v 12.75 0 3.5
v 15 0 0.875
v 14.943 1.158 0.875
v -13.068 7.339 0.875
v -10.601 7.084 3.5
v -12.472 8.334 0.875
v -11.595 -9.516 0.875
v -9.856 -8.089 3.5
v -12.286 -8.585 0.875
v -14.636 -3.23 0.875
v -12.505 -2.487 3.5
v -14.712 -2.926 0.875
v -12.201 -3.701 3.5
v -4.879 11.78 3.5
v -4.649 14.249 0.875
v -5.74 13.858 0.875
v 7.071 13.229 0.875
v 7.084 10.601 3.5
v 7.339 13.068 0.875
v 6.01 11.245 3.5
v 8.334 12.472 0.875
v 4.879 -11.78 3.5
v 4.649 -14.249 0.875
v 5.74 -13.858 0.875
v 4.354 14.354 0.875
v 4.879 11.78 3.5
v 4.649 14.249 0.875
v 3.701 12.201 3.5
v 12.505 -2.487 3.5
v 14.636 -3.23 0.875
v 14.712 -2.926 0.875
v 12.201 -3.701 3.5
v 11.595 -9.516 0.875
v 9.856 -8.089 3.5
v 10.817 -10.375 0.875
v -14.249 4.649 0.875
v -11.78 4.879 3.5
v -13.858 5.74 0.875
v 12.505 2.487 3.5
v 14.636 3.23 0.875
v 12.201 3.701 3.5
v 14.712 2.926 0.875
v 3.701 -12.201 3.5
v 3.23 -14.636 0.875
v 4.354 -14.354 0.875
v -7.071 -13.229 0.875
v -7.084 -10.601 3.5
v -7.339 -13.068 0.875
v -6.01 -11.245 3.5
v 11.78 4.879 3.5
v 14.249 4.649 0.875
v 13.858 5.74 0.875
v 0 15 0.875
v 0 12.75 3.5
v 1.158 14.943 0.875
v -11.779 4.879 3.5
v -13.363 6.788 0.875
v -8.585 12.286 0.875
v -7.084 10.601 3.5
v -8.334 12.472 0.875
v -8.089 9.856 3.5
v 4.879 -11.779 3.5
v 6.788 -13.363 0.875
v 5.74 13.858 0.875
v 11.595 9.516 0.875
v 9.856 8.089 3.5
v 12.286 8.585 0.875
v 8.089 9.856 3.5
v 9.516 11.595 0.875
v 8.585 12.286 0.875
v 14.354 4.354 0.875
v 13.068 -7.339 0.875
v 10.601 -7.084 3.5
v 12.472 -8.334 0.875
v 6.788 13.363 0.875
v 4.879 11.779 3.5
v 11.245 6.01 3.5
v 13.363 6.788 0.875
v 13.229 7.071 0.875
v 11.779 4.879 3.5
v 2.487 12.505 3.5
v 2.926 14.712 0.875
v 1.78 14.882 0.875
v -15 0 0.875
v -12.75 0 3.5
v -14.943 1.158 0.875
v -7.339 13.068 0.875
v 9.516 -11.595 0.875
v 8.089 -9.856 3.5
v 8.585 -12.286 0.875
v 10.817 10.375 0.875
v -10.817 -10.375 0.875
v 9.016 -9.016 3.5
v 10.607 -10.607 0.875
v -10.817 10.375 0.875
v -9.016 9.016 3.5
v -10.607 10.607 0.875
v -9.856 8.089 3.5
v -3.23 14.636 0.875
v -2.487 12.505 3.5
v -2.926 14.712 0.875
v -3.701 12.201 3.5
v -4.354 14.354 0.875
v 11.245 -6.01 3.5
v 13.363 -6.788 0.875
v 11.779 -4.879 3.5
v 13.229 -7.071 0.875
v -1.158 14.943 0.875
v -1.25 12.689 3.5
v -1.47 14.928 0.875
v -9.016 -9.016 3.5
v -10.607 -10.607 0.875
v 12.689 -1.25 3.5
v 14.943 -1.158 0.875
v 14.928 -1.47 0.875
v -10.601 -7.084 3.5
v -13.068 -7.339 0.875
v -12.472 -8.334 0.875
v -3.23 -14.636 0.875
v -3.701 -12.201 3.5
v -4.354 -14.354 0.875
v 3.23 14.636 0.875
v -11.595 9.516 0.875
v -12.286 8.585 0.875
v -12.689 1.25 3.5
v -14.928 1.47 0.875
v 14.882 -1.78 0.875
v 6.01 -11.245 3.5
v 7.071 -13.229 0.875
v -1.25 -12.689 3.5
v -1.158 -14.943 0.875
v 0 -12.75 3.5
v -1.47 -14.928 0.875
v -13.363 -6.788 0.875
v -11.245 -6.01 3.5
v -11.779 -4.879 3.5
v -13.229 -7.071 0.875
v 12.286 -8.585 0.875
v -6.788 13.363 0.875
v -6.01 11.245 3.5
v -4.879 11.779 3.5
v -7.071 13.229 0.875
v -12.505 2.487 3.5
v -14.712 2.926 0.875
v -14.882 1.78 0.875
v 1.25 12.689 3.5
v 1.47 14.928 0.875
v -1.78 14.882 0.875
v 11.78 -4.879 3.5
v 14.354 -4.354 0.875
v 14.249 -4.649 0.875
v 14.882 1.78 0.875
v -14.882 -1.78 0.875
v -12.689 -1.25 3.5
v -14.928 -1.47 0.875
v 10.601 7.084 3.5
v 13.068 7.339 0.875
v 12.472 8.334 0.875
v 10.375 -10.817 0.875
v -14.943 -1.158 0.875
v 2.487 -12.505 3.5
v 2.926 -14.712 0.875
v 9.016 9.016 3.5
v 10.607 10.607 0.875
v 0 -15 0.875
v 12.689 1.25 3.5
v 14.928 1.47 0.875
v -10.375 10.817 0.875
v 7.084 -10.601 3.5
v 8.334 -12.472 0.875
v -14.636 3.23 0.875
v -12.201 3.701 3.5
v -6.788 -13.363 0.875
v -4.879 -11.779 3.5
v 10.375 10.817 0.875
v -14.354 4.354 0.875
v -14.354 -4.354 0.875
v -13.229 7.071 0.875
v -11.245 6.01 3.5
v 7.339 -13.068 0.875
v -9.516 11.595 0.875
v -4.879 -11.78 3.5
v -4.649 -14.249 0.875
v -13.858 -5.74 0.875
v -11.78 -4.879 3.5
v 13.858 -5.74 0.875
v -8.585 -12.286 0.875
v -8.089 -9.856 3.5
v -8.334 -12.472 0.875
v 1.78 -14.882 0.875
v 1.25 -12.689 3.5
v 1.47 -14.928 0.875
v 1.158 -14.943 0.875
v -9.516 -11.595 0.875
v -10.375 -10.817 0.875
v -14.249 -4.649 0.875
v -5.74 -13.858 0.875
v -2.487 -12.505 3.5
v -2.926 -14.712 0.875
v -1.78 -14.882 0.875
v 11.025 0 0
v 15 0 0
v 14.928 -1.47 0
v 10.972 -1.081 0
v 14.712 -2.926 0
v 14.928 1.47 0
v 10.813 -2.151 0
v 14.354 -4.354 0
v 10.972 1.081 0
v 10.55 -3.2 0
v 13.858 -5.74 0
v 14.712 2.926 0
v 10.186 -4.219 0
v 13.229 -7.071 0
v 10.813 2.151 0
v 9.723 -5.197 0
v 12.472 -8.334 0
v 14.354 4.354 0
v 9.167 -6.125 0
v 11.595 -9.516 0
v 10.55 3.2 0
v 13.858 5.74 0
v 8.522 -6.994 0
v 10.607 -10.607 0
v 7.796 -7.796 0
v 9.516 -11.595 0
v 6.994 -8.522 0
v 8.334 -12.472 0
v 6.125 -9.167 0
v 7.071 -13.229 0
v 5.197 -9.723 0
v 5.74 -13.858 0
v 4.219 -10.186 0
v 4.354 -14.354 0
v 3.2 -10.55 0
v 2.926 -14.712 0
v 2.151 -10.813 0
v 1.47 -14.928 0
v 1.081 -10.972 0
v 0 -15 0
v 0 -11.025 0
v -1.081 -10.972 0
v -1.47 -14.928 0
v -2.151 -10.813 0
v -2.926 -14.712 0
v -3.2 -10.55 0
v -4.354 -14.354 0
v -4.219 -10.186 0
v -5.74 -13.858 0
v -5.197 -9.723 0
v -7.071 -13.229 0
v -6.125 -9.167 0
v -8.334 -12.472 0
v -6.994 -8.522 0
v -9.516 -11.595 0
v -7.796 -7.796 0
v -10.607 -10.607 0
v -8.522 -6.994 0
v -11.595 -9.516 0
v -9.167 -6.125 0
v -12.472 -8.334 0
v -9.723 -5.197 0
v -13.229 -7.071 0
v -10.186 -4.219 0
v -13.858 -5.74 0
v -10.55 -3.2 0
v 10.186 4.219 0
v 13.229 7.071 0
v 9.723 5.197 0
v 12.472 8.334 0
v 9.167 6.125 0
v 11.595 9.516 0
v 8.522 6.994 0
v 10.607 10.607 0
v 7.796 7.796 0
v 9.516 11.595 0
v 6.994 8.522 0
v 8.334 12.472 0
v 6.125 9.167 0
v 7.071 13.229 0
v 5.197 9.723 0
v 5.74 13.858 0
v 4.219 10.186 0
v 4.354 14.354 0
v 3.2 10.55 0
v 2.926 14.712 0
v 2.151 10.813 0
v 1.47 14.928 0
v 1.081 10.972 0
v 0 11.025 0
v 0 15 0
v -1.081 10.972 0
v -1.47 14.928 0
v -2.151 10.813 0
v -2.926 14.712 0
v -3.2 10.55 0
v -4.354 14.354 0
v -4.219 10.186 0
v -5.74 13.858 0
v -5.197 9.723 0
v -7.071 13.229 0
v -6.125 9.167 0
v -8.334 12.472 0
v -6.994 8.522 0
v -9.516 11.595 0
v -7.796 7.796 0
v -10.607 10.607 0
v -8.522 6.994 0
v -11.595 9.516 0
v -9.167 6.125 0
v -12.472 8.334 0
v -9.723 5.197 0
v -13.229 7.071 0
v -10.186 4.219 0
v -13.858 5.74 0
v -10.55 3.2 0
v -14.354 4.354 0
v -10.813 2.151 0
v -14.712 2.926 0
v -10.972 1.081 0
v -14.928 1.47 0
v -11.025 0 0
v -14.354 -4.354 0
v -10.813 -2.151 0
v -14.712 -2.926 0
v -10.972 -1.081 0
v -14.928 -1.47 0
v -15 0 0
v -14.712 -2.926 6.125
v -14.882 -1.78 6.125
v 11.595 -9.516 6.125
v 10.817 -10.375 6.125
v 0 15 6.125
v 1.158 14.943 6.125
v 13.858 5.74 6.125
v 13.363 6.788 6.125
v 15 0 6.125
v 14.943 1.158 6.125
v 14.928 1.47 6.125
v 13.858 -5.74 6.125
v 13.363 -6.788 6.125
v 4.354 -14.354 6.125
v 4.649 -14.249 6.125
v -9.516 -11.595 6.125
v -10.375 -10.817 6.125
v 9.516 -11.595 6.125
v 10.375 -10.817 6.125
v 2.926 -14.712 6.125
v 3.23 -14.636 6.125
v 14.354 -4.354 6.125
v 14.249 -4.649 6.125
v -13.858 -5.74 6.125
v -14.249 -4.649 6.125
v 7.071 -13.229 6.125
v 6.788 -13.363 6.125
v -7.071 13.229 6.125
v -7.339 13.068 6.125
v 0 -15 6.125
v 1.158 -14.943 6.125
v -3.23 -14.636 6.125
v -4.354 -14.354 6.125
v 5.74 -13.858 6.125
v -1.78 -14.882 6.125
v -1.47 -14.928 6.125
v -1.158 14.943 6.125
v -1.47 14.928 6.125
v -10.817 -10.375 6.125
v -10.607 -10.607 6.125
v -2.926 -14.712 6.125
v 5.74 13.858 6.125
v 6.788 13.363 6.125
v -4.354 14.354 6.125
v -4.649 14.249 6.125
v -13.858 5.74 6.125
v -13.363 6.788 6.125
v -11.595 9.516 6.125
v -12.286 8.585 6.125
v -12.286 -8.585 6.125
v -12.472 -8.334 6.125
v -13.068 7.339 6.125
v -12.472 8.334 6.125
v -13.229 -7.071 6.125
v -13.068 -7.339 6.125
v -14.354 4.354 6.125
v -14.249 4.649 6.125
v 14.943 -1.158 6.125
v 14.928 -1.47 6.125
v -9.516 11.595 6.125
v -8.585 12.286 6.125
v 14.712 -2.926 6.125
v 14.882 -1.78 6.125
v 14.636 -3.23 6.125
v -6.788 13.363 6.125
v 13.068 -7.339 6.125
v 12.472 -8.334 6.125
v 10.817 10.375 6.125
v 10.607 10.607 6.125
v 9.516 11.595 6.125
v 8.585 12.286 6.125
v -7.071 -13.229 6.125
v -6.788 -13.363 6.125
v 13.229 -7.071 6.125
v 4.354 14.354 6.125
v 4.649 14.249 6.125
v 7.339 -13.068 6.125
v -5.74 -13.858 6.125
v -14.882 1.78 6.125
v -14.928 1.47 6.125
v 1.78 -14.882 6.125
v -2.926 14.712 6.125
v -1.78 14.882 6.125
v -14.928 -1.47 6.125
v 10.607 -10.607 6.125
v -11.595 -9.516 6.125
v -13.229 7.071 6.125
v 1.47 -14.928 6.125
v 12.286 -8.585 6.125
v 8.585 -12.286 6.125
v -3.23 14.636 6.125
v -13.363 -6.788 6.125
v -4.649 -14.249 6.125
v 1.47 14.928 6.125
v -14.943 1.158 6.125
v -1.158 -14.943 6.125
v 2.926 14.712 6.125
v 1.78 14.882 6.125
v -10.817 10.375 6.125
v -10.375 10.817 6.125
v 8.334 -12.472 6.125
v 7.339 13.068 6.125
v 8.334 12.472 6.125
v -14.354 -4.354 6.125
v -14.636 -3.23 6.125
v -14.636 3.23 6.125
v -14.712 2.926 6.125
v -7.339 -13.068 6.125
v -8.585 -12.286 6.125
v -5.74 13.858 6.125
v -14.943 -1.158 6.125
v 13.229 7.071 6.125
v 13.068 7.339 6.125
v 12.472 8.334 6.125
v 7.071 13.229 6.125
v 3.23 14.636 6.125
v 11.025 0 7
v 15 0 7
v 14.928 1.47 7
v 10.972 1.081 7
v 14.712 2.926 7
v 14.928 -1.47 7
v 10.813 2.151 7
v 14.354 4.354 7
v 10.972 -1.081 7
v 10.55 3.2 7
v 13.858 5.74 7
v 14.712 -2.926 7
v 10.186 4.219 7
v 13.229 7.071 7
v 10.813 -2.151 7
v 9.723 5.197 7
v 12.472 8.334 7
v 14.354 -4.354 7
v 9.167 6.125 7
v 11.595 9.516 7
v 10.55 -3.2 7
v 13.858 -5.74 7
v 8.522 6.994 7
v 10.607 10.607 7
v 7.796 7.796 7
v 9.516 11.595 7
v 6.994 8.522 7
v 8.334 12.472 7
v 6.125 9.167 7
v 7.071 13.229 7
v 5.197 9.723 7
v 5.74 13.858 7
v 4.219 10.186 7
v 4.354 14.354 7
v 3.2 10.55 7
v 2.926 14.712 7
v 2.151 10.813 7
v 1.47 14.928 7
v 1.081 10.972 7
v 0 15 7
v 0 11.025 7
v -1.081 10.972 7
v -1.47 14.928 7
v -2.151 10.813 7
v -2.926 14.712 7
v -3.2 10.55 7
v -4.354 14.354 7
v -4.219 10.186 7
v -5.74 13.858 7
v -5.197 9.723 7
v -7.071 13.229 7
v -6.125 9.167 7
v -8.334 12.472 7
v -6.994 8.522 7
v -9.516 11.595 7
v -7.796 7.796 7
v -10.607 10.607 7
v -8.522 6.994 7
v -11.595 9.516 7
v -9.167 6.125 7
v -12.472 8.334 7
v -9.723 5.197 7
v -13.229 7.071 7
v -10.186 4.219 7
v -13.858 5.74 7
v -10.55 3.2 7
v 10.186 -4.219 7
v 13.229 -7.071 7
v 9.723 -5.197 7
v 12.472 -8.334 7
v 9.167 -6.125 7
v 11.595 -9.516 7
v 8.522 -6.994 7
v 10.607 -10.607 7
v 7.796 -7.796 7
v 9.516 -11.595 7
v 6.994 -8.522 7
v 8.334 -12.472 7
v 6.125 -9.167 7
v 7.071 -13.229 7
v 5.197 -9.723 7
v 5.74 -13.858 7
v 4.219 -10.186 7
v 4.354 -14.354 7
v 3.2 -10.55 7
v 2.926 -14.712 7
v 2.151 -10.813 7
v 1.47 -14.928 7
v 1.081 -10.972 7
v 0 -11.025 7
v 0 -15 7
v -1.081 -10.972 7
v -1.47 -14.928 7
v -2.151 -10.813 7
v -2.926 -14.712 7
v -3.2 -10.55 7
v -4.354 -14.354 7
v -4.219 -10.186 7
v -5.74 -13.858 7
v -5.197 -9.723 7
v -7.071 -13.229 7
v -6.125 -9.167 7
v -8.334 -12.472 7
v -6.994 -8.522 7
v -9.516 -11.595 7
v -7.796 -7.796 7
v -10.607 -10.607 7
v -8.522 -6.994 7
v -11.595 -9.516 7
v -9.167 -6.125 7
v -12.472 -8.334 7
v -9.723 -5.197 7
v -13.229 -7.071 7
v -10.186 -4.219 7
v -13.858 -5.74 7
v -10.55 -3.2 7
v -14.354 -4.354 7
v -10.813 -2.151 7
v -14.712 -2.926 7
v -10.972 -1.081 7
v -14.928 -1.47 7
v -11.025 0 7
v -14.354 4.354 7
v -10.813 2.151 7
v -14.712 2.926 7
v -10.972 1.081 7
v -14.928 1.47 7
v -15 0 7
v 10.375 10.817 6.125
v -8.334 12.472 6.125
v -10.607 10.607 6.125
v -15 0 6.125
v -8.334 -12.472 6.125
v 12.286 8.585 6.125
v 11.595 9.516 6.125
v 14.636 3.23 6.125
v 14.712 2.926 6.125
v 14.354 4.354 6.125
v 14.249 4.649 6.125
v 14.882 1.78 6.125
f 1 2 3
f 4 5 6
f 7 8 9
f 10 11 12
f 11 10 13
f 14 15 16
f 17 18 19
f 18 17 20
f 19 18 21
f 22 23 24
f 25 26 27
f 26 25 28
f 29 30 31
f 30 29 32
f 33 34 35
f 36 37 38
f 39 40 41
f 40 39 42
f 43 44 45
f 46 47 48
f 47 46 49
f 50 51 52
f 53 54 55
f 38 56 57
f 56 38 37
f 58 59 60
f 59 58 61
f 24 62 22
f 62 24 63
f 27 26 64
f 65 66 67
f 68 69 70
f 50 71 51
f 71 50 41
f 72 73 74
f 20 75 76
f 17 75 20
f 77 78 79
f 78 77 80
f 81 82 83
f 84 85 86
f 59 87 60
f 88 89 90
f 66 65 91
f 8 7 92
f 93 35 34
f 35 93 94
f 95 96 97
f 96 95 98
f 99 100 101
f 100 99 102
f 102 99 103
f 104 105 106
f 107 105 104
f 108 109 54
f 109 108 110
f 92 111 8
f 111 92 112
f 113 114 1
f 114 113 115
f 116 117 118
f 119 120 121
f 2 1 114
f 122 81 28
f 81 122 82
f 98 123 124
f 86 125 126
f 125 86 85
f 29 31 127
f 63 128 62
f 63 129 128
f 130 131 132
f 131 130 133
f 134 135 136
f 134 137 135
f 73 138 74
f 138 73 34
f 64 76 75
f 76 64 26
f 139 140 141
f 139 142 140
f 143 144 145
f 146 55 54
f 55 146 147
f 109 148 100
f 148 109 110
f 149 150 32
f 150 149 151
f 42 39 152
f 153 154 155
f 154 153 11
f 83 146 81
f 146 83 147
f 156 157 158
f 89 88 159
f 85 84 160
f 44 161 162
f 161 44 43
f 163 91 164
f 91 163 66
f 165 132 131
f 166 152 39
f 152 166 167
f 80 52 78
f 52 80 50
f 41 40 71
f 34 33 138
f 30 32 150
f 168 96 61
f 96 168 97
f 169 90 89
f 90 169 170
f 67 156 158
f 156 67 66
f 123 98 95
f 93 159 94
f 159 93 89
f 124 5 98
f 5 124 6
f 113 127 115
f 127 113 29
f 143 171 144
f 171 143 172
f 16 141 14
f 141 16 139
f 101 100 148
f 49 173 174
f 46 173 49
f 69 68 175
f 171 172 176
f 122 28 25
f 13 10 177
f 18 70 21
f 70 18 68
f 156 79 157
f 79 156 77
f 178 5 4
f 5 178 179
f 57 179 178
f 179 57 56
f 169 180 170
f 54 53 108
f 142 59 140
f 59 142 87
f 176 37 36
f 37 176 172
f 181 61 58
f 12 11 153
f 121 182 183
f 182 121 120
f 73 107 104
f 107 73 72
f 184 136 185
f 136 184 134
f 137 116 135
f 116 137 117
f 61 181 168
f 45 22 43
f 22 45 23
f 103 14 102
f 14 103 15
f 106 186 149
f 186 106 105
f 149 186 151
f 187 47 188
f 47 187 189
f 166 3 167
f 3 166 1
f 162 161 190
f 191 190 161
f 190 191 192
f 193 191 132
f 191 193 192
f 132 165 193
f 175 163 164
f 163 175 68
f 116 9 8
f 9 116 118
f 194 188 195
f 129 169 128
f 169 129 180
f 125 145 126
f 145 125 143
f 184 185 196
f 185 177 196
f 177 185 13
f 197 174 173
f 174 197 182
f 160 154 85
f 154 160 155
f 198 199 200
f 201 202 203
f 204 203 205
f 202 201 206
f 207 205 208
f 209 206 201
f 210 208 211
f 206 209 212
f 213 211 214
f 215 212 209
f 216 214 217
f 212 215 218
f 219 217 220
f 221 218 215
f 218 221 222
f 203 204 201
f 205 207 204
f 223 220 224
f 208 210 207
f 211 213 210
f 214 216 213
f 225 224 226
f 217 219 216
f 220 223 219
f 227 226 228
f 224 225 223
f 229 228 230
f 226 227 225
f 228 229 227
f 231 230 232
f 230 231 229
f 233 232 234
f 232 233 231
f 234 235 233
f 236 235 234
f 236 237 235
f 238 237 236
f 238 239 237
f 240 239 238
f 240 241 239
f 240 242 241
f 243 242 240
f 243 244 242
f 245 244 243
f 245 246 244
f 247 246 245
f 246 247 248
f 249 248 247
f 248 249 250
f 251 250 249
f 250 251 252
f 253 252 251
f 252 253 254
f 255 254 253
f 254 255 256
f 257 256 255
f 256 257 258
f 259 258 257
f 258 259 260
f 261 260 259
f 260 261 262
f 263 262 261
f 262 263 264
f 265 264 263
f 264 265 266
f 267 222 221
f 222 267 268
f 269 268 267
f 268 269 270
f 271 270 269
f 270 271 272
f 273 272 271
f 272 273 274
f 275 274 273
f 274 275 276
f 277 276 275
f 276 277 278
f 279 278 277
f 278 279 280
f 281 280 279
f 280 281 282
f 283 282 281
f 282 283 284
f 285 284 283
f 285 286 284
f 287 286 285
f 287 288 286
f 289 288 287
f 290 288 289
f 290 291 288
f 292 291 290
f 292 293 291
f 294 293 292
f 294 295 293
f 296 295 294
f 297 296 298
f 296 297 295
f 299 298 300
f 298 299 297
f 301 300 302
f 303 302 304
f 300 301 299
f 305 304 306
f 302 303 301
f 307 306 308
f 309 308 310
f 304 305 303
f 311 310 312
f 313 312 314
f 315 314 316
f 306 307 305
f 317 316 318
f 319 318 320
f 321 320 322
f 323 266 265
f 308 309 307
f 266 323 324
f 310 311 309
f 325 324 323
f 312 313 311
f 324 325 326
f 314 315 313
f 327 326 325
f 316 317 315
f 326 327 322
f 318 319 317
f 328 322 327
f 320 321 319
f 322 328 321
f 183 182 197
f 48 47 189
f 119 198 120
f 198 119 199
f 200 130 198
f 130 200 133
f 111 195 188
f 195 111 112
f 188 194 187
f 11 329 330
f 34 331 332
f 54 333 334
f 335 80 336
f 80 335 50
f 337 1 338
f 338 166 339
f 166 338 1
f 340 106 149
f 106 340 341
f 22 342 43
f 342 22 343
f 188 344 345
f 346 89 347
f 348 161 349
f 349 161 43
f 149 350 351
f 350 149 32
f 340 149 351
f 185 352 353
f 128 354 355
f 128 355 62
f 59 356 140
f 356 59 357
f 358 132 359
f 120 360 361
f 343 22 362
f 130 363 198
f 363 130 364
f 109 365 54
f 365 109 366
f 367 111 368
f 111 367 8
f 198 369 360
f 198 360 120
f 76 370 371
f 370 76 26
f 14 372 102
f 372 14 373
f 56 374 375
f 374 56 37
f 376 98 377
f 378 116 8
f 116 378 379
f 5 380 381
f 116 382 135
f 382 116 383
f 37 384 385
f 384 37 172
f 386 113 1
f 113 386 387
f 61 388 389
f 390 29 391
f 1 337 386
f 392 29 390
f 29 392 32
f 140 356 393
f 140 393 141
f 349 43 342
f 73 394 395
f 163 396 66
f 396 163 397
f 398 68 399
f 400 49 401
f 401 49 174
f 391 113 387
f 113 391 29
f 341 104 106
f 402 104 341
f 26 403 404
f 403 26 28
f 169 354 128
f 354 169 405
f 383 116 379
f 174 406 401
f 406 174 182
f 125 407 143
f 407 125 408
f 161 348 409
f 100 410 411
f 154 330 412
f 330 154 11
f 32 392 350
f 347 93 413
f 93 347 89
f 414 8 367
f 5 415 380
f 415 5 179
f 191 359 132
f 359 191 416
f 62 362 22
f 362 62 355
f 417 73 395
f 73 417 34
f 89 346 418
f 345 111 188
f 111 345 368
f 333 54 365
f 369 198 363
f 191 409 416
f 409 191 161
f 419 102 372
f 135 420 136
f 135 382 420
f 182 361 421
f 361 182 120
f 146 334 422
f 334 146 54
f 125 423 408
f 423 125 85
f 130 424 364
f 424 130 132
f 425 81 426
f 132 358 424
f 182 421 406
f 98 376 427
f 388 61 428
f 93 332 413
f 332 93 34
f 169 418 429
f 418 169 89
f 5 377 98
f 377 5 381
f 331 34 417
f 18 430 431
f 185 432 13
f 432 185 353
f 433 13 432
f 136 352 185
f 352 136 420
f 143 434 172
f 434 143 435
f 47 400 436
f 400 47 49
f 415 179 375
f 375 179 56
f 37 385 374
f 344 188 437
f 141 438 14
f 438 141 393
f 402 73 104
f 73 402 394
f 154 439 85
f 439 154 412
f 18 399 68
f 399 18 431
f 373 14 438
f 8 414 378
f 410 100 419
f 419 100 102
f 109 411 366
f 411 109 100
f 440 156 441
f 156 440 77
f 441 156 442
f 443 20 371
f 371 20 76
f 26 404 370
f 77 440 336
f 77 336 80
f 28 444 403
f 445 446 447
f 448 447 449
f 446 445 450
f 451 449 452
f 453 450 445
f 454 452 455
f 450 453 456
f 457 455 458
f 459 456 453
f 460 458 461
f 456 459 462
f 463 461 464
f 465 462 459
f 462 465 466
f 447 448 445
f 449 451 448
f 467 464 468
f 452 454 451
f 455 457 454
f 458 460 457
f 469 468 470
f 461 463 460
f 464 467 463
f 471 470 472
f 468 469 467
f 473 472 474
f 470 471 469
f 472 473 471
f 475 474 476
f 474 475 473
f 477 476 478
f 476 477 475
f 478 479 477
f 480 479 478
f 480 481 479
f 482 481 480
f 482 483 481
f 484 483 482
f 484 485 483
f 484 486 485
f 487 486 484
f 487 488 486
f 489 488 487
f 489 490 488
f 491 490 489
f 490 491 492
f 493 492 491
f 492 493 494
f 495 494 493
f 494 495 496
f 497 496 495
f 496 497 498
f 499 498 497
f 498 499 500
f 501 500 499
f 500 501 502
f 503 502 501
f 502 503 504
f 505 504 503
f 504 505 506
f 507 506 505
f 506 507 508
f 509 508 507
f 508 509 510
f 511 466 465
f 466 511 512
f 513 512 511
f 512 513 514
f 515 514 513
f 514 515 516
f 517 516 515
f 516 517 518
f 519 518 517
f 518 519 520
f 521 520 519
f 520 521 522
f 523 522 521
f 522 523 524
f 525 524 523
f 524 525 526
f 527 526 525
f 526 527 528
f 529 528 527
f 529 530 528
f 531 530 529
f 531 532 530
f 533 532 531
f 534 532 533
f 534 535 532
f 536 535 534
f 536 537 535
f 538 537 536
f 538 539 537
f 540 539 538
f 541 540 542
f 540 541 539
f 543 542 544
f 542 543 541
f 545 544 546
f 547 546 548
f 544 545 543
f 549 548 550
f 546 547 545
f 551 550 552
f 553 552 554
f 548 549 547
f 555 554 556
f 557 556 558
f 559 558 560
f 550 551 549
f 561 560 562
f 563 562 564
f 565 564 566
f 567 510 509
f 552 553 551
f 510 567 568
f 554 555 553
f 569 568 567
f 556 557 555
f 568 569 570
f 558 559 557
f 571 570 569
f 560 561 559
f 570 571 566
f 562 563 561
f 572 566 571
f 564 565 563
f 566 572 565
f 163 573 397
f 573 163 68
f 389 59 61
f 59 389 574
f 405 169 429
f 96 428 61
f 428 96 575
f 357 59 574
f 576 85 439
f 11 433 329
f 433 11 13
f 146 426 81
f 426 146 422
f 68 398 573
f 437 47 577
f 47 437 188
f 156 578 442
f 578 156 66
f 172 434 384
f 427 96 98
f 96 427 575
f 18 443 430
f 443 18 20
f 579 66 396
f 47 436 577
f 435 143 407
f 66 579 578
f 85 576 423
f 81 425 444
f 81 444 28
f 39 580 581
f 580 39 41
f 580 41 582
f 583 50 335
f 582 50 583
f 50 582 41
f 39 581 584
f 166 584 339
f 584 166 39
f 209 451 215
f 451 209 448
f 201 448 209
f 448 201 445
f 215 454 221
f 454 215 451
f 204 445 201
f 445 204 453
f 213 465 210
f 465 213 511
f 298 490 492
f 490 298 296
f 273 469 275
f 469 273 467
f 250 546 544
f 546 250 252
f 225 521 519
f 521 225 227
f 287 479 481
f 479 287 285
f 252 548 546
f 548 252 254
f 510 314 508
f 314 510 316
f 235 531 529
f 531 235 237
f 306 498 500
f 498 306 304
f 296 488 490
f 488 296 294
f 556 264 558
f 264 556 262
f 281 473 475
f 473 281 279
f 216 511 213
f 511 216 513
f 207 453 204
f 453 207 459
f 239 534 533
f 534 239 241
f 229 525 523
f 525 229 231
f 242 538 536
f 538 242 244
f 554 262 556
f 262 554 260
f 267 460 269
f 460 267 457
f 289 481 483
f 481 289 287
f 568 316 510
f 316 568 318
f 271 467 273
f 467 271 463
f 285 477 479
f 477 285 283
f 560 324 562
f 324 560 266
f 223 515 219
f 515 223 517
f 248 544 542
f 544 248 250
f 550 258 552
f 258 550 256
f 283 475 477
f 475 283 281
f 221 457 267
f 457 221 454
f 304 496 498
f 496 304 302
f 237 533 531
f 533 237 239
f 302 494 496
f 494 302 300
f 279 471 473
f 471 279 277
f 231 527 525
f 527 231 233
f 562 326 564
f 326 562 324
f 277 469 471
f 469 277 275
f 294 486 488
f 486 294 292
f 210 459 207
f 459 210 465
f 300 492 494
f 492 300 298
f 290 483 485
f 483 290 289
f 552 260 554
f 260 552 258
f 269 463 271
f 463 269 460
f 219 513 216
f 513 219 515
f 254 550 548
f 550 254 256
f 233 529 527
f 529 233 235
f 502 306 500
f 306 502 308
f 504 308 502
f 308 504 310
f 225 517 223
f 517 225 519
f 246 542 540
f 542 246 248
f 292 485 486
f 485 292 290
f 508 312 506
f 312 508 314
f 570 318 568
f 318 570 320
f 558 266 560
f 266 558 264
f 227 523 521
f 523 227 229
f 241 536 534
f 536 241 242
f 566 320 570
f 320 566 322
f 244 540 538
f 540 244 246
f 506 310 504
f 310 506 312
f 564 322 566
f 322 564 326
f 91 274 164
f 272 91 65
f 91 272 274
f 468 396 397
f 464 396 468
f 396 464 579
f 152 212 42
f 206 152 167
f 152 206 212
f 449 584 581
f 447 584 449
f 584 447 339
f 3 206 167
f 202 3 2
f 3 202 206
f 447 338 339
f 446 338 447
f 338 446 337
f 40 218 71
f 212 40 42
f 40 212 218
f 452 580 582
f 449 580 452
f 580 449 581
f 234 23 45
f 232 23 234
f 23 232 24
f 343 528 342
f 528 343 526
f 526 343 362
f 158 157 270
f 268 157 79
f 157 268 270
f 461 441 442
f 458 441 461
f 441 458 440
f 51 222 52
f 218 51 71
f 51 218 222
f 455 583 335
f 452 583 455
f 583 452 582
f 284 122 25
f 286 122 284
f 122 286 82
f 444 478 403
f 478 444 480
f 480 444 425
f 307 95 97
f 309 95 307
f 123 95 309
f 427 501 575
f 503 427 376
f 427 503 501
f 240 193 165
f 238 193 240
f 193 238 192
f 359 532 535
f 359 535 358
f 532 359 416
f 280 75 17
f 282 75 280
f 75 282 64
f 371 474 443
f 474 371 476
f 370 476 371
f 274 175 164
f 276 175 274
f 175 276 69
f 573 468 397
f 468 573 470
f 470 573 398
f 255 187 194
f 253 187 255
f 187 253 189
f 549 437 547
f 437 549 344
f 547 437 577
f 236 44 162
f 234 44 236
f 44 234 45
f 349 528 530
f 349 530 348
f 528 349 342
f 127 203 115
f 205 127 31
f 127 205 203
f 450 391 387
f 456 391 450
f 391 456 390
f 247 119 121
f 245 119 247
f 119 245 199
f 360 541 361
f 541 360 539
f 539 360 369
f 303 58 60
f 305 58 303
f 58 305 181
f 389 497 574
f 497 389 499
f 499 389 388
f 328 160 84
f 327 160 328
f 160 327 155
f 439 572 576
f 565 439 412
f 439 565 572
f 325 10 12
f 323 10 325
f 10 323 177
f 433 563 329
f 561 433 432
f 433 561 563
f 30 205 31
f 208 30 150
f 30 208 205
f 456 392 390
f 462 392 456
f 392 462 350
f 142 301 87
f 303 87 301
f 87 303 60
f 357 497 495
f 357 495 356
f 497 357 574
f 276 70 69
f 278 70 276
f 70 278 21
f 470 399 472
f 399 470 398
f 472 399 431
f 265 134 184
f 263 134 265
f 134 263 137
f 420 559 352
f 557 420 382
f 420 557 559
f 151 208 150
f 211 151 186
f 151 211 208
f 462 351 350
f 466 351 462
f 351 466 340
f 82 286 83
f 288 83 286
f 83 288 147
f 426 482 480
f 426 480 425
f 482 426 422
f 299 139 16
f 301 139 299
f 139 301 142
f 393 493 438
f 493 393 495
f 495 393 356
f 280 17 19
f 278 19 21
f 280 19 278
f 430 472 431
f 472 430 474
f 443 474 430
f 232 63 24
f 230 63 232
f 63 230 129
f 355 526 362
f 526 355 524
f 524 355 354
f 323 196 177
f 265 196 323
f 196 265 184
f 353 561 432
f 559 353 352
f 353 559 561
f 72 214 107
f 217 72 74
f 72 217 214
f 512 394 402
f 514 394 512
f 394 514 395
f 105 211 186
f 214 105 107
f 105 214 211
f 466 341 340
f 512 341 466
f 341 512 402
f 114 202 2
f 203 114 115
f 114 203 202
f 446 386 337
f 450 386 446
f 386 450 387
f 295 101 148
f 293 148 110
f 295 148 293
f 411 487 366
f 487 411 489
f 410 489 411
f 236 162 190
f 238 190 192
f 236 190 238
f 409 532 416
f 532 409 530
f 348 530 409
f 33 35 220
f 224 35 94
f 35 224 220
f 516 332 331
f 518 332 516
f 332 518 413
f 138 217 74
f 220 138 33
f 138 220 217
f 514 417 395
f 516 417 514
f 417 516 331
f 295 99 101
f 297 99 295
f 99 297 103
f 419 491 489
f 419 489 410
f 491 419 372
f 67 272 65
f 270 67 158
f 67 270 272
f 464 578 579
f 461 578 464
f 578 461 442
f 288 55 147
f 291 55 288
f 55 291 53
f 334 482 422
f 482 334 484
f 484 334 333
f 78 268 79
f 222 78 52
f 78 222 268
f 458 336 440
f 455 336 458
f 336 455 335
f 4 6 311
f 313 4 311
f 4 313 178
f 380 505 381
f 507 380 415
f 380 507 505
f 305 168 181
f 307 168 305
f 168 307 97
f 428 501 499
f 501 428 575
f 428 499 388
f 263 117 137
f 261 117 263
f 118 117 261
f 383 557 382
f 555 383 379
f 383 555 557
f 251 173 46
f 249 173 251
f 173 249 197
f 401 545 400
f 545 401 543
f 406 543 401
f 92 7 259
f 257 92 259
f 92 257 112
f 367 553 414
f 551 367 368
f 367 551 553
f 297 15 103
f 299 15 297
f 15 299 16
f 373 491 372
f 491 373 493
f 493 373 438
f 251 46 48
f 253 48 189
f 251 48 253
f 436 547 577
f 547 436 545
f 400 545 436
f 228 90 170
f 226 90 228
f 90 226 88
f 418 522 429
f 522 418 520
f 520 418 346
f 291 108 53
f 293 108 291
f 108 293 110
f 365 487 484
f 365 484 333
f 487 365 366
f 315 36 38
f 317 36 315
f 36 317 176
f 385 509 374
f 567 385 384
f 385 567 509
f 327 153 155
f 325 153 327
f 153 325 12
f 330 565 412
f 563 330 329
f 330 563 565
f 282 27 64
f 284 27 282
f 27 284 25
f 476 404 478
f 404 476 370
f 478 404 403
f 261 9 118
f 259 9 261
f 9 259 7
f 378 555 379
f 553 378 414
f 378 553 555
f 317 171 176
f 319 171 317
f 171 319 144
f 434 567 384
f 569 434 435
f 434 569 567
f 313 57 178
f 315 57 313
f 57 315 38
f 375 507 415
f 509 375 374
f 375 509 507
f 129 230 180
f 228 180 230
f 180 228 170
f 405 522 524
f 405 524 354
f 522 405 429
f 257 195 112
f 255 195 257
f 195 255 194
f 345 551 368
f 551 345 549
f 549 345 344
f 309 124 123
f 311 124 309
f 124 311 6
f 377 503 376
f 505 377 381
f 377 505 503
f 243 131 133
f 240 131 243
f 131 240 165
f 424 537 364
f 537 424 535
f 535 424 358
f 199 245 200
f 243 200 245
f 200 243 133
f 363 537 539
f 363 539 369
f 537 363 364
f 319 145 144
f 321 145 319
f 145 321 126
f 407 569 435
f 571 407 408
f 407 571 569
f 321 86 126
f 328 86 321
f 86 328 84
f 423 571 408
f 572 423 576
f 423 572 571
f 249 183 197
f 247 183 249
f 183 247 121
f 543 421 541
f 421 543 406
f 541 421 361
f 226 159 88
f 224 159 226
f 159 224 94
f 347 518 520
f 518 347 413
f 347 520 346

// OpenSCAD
//Segments in the circles (Higher numbers produce smoother curve, but take longer to render)
segments = 64;
//Thickness of bearing
w = 7;
//Outer Diameter of roller
outer_d   = 30;
//Diameter of V-Trough
inner_d   = 25.5;
//Diameter of bearing
bearing_d = 22.05;
//Amount to cut off flanges to produce flat circumference (0 - 2 works well at default diameters)
cut = 0.75; // [0:0.01:10]

difference(){
    difference(){
        union(){
            cylinder(h=w/2, r1=outer_d/2+cut, r2=inner_d/2, $fn=segments);
            translate([0,0,w/2-0.0001])
            cylinder(h=w/2, r1=inner_d/2, r2=outer_d/2+cut, $fn=segments);
        }
        translate(0,0,-1)
        cylinder(h=w+2, r1=bearing_d/2, r2=bearing_d/2, $fn=segments);
    }
    difference(){
        
        cube(outer_d+5+cut*2, center=true);
        translate([0,0,-1])
        cylinder(h=w+2, r1=outer_d/2, r2=outer_d/2, $fn=segments);
    }
}
